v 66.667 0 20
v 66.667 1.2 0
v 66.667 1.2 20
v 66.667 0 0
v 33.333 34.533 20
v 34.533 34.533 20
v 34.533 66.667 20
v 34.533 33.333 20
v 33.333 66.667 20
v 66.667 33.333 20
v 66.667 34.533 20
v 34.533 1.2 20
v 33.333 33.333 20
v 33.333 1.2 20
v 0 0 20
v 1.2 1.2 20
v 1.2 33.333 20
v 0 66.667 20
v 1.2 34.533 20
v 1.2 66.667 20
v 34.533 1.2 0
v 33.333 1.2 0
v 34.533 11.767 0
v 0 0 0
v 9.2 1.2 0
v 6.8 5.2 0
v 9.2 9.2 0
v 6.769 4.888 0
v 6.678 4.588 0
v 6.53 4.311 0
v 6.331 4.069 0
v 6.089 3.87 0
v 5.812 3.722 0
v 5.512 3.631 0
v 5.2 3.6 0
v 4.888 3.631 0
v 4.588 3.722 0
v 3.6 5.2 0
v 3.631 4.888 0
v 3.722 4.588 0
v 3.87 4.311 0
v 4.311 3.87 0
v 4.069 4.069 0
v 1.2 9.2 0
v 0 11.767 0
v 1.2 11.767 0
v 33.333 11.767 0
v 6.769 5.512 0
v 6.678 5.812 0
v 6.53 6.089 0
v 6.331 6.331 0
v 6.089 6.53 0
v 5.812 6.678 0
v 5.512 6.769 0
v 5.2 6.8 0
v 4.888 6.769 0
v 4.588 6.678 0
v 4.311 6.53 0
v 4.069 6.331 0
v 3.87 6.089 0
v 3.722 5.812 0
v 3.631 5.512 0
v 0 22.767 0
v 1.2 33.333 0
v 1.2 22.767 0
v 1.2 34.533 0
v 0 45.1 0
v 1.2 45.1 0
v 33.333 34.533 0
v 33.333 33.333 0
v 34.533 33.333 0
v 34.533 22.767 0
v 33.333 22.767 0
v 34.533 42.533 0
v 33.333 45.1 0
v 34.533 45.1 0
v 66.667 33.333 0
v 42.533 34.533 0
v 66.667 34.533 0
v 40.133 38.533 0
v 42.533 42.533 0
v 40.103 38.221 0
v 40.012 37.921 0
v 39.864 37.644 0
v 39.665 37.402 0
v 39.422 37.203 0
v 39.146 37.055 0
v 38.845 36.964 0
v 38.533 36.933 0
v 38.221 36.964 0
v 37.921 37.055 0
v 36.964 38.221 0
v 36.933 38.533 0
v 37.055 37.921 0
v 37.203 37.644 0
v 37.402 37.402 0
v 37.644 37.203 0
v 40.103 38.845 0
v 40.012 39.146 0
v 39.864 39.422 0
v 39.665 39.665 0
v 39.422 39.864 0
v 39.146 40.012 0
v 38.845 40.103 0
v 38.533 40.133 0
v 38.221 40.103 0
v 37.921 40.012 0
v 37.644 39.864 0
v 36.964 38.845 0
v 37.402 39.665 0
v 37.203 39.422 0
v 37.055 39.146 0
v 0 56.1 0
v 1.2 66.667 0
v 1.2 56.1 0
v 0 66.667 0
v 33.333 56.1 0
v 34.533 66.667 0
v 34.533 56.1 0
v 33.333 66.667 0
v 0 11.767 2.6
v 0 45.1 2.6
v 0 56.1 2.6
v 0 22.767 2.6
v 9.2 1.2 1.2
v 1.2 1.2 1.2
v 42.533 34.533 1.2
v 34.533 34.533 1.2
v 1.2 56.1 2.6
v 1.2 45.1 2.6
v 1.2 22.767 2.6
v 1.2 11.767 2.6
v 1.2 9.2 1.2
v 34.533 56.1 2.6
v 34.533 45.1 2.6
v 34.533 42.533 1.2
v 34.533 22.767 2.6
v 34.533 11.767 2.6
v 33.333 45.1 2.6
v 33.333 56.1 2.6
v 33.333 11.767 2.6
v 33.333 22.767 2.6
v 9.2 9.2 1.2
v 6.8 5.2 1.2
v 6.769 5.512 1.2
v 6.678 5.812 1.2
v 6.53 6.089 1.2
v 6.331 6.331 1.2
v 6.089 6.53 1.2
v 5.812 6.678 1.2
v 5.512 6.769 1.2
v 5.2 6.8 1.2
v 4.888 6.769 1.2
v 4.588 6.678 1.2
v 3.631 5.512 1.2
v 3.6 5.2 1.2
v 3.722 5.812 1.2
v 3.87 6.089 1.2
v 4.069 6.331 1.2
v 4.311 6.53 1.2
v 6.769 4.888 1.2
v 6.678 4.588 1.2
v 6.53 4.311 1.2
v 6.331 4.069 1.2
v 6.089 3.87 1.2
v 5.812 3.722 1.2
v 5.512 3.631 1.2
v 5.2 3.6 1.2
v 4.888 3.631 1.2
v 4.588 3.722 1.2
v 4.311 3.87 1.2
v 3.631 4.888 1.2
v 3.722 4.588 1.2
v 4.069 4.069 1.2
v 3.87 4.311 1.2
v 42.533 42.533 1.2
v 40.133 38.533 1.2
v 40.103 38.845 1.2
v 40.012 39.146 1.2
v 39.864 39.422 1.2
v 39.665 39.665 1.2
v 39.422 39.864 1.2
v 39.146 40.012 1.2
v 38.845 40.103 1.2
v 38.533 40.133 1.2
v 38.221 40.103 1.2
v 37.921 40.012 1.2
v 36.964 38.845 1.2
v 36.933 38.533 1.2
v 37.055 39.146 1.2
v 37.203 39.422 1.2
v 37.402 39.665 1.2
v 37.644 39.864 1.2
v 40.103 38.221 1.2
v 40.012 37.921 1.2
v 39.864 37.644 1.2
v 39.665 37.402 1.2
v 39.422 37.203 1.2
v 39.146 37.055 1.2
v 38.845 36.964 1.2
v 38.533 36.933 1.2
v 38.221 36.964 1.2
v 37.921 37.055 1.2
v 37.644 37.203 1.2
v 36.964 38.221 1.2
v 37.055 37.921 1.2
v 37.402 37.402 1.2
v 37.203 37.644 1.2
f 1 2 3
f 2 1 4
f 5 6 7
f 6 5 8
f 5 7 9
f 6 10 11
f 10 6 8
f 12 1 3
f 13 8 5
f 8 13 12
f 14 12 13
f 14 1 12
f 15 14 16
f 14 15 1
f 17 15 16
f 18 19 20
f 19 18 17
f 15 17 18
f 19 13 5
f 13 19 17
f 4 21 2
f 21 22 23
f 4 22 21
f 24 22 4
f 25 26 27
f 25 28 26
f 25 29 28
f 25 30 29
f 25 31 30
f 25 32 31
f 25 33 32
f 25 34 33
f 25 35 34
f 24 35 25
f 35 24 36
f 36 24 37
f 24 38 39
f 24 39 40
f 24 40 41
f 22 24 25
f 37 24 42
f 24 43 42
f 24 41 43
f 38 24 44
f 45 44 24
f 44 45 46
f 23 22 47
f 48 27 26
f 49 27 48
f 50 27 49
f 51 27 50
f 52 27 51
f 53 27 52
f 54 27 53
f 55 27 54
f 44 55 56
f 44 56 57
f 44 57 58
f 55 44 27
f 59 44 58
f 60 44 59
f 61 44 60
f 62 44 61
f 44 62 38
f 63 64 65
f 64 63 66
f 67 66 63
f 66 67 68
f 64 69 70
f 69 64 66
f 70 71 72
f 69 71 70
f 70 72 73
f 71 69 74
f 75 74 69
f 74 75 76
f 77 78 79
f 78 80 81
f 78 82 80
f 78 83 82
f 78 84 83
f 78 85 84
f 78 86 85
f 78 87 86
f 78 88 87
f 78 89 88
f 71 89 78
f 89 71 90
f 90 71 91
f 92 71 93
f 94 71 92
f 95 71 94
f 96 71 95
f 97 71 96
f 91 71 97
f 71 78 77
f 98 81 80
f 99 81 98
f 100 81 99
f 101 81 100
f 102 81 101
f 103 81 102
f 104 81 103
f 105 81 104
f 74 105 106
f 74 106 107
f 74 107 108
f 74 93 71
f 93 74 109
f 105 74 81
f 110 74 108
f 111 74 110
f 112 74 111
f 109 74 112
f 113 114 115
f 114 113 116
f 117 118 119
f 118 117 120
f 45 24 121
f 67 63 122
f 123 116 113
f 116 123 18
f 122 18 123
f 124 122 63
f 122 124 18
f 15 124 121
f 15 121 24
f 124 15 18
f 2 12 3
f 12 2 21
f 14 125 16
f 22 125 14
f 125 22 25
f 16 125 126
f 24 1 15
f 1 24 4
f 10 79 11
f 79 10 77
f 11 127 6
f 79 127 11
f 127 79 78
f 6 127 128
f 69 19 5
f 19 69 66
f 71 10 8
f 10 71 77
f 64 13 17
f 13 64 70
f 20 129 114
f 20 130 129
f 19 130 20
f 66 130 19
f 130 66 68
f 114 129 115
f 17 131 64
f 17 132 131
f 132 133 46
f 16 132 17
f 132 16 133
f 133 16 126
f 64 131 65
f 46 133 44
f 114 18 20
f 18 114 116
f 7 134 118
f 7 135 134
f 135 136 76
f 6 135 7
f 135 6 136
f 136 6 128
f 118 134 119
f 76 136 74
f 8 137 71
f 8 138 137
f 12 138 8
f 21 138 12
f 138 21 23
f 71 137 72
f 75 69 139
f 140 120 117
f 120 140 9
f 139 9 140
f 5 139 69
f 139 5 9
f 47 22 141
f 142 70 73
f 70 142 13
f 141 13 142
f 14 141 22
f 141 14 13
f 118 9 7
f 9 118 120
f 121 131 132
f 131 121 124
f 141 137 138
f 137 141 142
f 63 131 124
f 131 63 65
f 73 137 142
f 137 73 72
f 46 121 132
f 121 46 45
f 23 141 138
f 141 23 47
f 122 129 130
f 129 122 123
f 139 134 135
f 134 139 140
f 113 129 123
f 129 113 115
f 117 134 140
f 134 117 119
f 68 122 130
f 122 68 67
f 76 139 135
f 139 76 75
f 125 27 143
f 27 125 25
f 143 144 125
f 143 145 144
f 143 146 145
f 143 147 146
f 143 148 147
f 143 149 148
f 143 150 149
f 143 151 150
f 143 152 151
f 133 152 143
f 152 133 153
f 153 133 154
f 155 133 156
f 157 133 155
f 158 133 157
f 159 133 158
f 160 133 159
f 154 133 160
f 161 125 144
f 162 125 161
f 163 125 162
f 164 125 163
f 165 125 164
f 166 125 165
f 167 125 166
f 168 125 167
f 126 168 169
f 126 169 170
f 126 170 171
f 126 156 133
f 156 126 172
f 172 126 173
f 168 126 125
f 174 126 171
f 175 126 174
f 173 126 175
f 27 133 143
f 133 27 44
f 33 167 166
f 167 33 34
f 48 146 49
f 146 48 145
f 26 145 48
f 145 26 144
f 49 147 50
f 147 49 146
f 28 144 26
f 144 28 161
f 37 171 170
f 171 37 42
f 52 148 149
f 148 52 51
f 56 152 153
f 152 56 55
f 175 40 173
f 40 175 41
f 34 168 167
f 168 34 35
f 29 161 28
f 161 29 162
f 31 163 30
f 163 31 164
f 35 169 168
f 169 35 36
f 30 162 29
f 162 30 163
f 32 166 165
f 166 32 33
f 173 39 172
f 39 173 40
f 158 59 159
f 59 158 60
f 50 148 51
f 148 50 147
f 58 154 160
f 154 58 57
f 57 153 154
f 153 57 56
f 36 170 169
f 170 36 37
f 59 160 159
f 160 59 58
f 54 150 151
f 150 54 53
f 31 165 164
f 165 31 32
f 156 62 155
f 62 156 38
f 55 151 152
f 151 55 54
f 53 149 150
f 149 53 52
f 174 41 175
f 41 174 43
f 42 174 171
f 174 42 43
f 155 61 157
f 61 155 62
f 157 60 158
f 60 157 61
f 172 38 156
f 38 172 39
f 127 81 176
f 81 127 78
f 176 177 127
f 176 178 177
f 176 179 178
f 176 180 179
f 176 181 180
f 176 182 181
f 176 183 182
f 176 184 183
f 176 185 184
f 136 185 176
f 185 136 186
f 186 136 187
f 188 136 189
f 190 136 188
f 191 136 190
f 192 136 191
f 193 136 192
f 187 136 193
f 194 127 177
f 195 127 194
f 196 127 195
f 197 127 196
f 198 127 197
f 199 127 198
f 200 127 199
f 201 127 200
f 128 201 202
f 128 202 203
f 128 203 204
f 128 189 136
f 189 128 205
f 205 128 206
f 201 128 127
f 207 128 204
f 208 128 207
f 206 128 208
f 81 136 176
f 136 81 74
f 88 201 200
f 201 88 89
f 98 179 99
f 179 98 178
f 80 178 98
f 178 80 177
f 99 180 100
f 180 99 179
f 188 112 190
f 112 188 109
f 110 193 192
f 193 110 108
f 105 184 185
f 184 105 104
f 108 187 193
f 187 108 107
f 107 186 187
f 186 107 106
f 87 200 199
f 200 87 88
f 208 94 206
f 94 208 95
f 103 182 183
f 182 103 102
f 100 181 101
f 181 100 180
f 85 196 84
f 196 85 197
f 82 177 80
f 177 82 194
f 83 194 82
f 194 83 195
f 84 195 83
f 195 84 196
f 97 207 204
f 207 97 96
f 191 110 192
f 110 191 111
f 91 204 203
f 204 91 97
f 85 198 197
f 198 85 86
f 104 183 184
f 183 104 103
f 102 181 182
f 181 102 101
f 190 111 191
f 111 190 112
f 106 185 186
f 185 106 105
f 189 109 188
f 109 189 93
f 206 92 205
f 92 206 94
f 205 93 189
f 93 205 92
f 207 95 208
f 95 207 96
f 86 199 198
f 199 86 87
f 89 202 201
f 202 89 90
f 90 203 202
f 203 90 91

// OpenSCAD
// KenLED v2 baffle grid — one light-tight cell per LED, printed as tiles.
// Black PETG, prints standing up, no supports.
//
// L-TILES: every wall is full thickness. A tile carries the walls on its
// x=0 and y=0 edges plus all interior walls, and is OPEN on its far edges;
// the neighbouring tile's edge walls close those cells. No half-walls, no
// seams inside a wall, pitch stays exact across the panel. The panel's two
// far edges are closed by the frame's inner rail (or set close_x/close_y).
//
//   openscad -D cols=2 -D rows=2 -D close_x=true -D close_y=true -o baffle-2x2-closed.stl baffle.scad
//   openscad -D cols=5 -D rows=5 -o baffle-5x5.stl baffle.scad

// ---- grid (mm) ----
pitch  = 1000 / 30;   // 33.333 — WS2812B-ECO 30 LED/m
cols   = 2;           // cells across (strip direction, X)
rows   = 2;           // cells down (Y)
depth  = 20;          // LED-to-diffuser distance; >= pitch/2 for even cells

// ---- walls ----
wall   = 1.2;         // 3 perimeters @ 0.4 nozzle (or 2 @ 0.6)
close_x = false;      // add the far X wall (last tile column, if the frame doesn't close it)
close_y = false;      // add the far Y wall (last tile row)

// ---- LED strip channel (strips run along X through each row's centre) ----
strip_w = 10 + 1.0;   // 10 mm PCB + slip
strip_h = 2.6;        // PCB + LED package + adhesive

// ---- mounting tabs: small feet in the cell corners next to the tile's own walls ----
tabs      = true;
tab       = 8;
tab_t     = 1.2;
tab_hole  = 3.2;

$fn = 32;

W = cols * pitch;
H = rows * pitch;
nx = cols + (close_x ? 1 : 0);   // number of Y-direction walls
ny = rows + (close_y ? 1 : 0);   // number of X-direction walls

module tile() {
  difference() {
    union() {
      // walls along X (row boundaries): at y = 0, pitch, ... ; far one only if close_y
      for (r = [0 : ny - 1])
        translate([0, r * pitch, 0]) cube([W + (close_x ? wall : 0), wall, depth]);
      // walls along Y (column boundaries): at x = 0, pitch, ... ; far one only if close_x
      for (c = [0 : nx - 1])
        translate([c * pitch, 0, 0]) cube([wall, H + (close_y ? wall : 0), depth]);
    }
    // strip notches through every Y-wall at each row centre (flat bridge, full-width wall)
    for (r = [0 : rows - 1])
      translate([-1, r * pitch + wall + (pitch - wall) / 2 - strip_w / 2, -1])
        cube([W + wall + 2, strip_w, strip_h + 1]);
  }
  if (tabs)
    for (c = [0 : cols - 1], r = [0 : rows - 1])
      if ((c + r) % 2 == 0)   // every other cell is plenty
        difference() {
          translate([c * pitch + wall, r * pitch + wall, 0]) cube([tab, tab, tab_t]);
          translate([c * pitch + wall + tab / 2, r * pitch + wall + tab / 2, -1])
            cylinder(h = tab_t + 2, d = tab_hole);
        }
}

tile();

echo(str("L-tile ", cols, "x", rows, " footprint ", W, " x ", H,
         " (+wall on closed edges), depth ", depth, ", wall ", wall,
         ", cell clear ", pitch - wall, ", notch ", strip_w, "x", strip_h));
